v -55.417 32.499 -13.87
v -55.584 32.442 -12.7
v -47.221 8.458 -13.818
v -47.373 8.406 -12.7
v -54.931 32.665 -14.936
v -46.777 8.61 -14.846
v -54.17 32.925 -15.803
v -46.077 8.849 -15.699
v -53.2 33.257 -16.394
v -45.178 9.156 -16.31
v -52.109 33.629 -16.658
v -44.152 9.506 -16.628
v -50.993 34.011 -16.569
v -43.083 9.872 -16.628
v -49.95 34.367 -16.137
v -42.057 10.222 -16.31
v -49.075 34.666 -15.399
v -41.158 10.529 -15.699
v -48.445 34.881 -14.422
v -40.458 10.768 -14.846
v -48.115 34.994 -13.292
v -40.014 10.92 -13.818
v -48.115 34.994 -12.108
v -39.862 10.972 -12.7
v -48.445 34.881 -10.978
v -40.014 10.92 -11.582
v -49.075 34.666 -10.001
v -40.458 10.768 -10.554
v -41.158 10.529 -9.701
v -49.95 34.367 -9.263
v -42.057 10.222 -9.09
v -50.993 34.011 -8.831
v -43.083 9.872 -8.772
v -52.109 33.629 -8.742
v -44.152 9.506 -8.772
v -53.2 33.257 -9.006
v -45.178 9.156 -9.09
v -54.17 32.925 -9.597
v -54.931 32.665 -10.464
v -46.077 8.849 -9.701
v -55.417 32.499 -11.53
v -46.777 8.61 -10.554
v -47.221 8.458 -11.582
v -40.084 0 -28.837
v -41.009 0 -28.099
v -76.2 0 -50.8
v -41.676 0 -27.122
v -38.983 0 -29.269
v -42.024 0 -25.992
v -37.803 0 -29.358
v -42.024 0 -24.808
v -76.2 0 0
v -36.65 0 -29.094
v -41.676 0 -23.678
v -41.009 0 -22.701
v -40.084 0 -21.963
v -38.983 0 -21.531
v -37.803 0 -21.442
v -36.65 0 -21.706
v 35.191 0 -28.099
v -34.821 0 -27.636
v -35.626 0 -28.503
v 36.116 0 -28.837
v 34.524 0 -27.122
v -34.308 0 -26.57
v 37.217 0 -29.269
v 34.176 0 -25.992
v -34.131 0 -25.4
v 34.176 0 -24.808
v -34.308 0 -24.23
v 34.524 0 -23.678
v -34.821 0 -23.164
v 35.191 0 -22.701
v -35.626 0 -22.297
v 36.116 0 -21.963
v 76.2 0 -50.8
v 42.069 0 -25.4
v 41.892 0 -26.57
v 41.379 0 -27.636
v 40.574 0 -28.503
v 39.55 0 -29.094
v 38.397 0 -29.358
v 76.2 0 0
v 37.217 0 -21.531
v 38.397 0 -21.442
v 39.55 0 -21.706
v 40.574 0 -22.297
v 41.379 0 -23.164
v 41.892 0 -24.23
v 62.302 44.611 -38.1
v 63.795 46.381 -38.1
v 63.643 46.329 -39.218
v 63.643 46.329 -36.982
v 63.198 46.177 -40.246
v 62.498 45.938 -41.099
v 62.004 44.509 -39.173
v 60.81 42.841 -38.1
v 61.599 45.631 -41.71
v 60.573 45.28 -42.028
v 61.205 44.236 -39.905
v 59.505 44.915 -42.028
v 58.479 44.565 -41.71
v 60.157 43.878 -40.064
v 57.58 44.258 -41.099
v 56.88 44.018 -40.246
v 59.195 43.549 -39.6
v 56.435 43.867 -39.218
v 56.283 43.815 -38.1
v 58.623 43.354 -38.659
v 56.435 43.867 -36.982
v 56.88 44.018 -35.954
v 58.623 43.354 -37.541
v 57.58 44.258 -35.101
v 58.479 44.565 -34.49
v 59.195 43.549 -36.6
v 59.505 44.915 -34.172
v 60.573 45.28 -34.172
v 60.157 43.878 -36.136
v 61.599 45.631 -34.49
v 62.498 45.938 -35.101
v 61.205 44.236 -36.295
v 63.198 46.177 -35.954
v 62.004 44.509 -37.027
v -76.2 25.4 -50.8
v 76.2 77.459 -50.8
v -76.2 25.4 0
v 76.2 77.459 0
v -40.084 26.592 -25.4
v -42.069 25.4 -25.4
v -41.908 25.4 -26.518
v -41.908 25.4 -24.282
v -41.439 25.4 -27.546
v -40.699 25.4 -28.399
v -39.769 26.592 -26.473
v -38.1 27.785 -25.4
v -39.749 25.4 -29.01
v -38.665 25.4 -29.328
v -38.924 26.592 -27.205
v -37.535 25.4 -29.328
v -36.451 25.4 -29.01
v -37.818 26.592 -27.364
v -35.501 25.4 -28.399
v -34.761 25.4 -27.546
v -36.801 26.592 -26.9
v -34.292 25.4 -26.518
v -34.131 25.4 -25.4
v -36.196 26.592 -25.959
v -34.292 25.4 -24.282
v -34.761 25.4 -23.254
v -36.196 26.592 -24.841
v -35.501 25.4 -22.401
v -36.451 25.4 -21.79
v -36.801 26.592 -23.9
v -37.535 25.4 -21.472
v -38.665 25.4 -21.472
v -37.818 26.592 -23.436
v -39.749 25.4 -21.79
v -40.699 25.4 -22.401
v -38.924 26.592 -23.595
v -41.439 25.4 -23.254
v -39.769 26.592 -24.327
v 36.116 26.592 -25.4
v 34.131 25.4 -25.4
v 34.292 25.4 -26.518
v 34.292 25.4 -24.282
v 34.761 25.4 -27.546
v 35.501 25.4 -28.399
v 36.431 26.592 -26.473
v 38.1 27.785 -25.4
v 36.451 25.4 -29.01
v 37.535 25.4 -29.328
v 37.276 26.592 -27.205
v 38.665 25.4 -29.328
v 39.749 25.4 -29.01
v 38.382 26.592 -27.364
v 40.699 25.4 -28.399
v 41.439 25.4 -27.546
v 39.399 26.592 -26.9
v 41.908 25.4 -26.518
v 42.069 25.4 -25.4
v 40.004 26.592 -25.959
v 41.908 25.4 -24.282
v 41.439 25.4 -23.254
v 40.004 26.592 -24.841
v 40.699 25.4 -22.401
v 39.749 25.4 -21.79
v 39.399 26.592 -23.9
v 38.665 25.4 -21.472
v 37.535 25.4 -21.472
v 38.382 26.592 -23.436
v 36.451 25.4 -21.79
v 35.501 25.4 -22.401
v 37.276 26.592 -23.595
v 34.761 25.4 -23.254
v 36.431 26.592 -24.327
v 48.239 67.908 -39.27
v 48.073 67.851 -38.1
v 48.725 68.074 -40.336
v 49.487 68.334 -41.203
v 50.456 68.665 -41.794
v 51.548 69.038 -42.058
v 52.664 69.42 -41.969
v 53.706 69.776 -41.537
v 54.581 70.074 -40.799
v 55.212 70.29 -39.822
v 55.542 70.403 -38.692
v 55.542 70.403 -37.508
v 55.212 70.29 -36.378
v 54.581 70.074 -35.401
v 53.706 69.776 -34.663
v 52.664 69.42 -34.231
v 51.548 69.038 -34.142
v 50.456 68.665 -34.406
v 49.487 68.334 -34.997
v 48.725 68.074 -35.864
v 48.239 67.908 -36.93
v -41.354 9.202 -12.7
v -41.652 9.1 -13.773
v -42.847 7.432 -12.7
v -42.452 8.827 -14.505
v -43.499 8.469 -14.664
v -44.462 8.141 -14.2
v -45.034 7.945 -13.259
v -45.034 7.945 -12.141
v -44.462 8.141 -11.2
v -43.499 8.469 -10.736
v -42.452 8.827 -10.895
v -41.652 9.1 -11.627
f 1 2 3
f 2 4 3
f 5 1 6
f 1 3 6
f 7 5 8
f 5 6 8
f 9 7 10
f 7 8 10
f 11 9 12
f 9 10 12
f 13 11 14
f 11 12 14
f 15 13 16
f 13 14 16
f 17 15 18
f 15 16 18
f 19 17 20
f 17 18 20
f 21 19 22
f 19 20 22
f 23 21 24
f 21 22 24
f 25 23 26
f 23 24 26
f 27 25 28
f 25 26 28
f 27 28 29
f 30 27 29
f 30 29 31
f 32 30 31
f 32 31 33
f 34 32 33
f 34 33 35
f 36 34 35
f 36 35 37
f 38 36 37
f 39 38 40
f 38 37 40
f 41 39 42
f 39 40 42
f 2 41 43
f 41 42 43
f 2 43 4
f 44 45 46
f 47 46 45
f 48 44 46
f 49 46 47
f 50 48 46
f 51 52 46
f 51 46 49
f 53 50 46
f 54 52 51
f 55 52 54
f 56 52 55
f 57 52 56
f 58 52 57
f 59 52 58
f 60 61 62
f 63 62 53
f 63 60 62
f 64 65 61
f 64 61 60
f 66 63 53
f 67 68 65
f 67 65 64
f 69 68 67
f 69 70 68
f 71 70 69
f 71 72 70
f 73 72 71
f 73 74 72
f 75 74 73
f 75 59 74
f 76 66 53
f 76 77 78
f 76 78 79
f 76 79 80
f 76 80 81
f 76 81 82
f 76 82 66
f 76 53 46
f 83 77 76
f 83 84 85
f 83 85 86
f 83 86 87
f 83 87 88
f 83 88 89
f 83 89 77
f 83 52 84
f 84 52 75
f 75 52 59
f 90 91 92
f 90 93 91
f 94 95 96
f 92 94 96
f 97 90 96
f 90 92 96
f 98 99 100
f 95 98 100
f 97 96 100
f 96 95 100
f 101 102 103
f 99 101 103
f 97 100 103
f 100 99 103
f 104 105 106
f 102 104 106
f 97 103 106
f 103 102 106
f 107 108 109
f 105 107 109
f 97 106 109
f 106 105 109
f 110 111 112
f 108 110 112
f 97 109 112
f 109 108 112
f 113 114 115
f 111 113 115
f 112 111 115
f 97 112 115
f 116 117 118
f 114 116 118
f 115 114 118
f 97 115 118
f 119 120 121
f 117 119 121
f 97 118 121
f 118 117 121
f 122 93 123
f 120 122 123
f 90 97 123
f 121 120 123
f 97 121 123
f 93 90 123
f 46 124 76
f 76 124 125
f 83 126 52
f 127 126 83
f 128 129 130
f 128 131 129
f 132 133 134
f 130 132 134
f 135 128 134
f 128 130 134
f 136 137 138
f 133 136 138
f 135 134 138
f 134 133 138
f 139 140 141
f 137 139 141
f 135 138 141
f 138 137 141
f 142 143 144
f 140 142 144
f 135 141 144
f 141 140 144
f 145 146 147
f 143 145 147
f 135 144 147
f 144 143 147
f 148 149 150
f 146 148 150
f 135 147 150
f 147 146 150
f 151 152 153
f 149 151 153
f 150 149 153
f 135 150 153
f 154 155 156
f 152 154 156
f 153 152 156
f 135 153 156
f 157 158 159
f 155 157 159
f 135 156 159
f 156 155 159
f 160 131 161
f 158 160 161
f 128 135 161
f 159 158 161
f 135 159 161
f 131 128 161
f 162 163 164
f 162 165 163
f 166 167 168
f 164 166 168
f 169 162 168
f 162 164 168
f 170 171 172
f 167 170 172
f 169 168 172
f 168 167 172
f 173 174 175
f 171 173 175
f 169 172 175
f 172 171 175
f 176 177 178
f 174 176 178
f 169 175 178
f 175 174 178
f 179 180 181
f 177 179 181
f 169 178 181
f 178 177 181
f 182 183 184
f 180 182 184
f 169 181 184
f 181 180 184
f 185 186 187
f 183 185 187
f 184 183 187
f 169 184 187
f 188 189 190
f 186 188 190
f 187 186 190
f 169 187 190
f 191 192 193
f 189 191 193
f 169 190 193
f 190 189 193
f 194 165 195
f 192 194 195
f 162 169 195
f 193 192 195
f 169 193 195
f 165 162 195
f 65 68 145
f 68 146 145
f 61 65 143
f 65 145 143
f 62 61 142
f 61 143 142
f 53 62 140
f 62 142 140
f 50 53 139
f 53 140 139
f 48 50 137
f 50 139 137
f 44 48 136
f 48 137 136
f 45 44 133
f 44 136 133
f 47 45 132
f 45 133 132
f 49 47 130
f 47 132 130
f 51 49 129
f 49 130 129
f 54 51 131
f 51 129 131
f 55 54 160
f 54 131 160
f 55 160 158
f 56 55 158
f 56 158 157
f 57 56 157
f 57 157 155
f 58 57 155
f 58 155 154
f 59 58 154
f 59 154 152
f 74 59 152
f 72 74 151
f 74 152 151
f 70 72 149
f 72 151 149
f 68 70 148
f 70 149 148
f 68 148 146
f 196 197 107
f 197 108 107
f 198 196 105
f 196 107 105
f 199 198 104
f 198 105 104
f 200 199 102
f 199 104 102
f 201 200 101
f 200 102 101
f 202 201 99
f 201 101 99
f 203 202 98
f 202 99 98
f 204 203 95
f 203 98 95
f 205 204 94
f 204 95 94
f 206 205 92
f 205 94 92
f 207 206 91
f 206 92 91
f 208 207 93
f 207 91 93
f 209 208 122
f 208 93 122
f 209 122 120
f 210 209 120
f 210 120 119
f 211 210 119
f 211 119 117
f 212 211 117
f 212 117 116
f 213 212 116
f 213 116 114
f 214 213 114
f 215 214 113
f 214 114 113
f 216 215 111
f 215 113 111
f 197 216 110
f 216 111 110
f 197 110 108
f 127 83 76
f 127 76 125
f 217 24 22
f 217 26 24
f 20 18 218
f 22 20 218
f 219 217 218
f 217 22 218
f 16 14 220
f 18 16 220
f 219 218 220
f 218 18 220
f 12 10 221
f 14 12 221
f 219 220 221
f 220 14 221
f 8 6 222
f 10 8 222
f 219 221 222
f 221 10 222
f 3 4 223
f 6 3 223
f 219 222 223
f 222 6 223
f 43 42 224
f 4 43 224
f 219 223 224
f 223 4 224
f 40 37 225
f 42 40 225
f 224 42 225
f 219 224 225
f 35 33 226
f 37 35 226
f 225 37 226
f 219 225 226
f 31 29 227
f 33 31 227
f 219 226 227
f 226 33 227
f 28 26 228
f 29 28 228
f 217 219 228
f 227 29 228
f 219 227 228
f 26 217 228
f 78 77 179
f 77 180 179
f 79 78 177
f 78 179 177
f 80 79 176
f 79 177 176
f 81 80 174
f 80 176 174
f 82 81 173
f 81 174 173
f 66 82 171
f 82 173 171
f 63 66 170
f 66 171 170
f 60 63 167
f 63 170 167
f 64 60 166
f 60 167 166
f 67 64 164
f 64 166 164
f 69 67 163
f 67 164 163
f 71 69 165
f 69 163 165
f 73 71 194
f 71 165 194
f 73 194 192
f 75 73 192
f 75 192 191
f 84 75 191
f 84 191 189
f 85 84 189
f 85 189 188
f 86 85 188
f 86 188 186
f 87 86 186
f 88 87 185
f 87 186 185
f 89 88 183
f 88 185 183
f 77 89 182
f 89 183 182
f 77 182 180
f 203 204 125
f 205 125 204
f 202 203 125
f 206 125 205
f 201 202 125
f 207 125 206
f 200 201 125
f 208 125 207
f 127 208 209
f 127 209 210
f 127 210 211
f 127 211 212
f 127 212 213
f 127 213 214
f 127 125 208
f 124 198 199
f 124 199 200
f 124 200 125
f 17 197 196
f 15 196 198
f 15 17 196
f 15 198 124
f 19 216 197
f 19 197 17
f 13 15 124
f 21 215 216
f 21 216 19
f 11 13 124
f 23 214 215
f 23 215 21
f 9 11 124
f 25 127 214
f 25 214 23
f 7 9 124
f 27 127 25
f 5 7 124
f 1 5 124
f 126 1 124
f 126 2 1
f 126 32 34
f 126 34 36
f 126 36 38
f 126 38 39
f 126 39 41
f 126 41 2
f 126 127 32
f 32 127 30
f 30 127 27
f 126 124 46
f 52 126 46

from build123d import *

# Parameters (mm, degrees)
BOSS_EXTRUDE1_DEPTH         = 50.8
F_3_8_16_TAPPED_HOLE1_D     = 7.9375
F_3_8_16_TAPPED_HOLE1_DEPTH = 25.4
F_3_8_16_TAPPED_HOLE1_TIP   = 2.384665582
F_3_8_16_TAPPED_HOLE2_D     = 7.9375
F_3_8_16_TAPPED_HOLE2_DEPTH = 25.4
F_3_8_16_TAPPED_HOLE2_TIP   = 2.384665582


with BuildPart() as part:
    # Sketch1 → Boss-Extrude1 (new body)
    with BuildSketch(Plane.XY):
        Polygon((-76.2, 0), (76.2, 0), (76.2, 77.459343803), (-76.2, 25.4), align=None)
    extrude(amount=-BOSS_EXTRUDE1_DEPTH)

    # 3/8-16 Tapped Hole1
    with Locations(Plane(origin=(-15.732418717, 46.055528891, 0), x_dir=(0.946311265, 0.323256847, 0), z_dir=(-0.323256847, 0.946311265, 0))):
        with Locations((-38.143756412, 12.7), (71.393743588, 38.1)):
            Hole(F_3_8_16_TAPPED_HOLE1_D / 2, depth=F_3_8_16_TAPPED_HOLE1_DEPTH)
            with Locations((0, 0, -(F_3_8_16_TAPPED_HOLE1_DEPTH + F_3_8_16_TAPPED_HOLE1_TIP / 2))):  # 118° drill point
                Cone(0, F_3_8_16_TAPPED_HOLE1_D / 2, F_3_8_16_TAPPED_HOLE1_TIP, mode=Mode.SUBTRACT)

    # 3/8-16 Tapped Hole2
    with Locations(Plane(origin=(0, 0, 0), x_dir=(-1, 0, 0), z_dir=(0, -1, 0))):
        with Locations((38.1, 25.4), (-38.1, 25.4)):
            Hole(F_3_8_16_TAPPED_HOLE2_D / 2, depth=F_3_8_16_TAPPED_HOLE2_DEPTH)
            with Locations((0, 0, -(F_3_8_16_TAPPED_HOLE2_DEPTH + F_3_8_16_TAPPED_HOLE2_TIP / 2))):  # 118° drill point
                Cone(0, F_3_8_16_TAPPED_HOLE2_D / 2, F_3_8_16_TAPPED_HOLE2_TIP, mode=Mode.SUBTRACT)


solid = part.part
